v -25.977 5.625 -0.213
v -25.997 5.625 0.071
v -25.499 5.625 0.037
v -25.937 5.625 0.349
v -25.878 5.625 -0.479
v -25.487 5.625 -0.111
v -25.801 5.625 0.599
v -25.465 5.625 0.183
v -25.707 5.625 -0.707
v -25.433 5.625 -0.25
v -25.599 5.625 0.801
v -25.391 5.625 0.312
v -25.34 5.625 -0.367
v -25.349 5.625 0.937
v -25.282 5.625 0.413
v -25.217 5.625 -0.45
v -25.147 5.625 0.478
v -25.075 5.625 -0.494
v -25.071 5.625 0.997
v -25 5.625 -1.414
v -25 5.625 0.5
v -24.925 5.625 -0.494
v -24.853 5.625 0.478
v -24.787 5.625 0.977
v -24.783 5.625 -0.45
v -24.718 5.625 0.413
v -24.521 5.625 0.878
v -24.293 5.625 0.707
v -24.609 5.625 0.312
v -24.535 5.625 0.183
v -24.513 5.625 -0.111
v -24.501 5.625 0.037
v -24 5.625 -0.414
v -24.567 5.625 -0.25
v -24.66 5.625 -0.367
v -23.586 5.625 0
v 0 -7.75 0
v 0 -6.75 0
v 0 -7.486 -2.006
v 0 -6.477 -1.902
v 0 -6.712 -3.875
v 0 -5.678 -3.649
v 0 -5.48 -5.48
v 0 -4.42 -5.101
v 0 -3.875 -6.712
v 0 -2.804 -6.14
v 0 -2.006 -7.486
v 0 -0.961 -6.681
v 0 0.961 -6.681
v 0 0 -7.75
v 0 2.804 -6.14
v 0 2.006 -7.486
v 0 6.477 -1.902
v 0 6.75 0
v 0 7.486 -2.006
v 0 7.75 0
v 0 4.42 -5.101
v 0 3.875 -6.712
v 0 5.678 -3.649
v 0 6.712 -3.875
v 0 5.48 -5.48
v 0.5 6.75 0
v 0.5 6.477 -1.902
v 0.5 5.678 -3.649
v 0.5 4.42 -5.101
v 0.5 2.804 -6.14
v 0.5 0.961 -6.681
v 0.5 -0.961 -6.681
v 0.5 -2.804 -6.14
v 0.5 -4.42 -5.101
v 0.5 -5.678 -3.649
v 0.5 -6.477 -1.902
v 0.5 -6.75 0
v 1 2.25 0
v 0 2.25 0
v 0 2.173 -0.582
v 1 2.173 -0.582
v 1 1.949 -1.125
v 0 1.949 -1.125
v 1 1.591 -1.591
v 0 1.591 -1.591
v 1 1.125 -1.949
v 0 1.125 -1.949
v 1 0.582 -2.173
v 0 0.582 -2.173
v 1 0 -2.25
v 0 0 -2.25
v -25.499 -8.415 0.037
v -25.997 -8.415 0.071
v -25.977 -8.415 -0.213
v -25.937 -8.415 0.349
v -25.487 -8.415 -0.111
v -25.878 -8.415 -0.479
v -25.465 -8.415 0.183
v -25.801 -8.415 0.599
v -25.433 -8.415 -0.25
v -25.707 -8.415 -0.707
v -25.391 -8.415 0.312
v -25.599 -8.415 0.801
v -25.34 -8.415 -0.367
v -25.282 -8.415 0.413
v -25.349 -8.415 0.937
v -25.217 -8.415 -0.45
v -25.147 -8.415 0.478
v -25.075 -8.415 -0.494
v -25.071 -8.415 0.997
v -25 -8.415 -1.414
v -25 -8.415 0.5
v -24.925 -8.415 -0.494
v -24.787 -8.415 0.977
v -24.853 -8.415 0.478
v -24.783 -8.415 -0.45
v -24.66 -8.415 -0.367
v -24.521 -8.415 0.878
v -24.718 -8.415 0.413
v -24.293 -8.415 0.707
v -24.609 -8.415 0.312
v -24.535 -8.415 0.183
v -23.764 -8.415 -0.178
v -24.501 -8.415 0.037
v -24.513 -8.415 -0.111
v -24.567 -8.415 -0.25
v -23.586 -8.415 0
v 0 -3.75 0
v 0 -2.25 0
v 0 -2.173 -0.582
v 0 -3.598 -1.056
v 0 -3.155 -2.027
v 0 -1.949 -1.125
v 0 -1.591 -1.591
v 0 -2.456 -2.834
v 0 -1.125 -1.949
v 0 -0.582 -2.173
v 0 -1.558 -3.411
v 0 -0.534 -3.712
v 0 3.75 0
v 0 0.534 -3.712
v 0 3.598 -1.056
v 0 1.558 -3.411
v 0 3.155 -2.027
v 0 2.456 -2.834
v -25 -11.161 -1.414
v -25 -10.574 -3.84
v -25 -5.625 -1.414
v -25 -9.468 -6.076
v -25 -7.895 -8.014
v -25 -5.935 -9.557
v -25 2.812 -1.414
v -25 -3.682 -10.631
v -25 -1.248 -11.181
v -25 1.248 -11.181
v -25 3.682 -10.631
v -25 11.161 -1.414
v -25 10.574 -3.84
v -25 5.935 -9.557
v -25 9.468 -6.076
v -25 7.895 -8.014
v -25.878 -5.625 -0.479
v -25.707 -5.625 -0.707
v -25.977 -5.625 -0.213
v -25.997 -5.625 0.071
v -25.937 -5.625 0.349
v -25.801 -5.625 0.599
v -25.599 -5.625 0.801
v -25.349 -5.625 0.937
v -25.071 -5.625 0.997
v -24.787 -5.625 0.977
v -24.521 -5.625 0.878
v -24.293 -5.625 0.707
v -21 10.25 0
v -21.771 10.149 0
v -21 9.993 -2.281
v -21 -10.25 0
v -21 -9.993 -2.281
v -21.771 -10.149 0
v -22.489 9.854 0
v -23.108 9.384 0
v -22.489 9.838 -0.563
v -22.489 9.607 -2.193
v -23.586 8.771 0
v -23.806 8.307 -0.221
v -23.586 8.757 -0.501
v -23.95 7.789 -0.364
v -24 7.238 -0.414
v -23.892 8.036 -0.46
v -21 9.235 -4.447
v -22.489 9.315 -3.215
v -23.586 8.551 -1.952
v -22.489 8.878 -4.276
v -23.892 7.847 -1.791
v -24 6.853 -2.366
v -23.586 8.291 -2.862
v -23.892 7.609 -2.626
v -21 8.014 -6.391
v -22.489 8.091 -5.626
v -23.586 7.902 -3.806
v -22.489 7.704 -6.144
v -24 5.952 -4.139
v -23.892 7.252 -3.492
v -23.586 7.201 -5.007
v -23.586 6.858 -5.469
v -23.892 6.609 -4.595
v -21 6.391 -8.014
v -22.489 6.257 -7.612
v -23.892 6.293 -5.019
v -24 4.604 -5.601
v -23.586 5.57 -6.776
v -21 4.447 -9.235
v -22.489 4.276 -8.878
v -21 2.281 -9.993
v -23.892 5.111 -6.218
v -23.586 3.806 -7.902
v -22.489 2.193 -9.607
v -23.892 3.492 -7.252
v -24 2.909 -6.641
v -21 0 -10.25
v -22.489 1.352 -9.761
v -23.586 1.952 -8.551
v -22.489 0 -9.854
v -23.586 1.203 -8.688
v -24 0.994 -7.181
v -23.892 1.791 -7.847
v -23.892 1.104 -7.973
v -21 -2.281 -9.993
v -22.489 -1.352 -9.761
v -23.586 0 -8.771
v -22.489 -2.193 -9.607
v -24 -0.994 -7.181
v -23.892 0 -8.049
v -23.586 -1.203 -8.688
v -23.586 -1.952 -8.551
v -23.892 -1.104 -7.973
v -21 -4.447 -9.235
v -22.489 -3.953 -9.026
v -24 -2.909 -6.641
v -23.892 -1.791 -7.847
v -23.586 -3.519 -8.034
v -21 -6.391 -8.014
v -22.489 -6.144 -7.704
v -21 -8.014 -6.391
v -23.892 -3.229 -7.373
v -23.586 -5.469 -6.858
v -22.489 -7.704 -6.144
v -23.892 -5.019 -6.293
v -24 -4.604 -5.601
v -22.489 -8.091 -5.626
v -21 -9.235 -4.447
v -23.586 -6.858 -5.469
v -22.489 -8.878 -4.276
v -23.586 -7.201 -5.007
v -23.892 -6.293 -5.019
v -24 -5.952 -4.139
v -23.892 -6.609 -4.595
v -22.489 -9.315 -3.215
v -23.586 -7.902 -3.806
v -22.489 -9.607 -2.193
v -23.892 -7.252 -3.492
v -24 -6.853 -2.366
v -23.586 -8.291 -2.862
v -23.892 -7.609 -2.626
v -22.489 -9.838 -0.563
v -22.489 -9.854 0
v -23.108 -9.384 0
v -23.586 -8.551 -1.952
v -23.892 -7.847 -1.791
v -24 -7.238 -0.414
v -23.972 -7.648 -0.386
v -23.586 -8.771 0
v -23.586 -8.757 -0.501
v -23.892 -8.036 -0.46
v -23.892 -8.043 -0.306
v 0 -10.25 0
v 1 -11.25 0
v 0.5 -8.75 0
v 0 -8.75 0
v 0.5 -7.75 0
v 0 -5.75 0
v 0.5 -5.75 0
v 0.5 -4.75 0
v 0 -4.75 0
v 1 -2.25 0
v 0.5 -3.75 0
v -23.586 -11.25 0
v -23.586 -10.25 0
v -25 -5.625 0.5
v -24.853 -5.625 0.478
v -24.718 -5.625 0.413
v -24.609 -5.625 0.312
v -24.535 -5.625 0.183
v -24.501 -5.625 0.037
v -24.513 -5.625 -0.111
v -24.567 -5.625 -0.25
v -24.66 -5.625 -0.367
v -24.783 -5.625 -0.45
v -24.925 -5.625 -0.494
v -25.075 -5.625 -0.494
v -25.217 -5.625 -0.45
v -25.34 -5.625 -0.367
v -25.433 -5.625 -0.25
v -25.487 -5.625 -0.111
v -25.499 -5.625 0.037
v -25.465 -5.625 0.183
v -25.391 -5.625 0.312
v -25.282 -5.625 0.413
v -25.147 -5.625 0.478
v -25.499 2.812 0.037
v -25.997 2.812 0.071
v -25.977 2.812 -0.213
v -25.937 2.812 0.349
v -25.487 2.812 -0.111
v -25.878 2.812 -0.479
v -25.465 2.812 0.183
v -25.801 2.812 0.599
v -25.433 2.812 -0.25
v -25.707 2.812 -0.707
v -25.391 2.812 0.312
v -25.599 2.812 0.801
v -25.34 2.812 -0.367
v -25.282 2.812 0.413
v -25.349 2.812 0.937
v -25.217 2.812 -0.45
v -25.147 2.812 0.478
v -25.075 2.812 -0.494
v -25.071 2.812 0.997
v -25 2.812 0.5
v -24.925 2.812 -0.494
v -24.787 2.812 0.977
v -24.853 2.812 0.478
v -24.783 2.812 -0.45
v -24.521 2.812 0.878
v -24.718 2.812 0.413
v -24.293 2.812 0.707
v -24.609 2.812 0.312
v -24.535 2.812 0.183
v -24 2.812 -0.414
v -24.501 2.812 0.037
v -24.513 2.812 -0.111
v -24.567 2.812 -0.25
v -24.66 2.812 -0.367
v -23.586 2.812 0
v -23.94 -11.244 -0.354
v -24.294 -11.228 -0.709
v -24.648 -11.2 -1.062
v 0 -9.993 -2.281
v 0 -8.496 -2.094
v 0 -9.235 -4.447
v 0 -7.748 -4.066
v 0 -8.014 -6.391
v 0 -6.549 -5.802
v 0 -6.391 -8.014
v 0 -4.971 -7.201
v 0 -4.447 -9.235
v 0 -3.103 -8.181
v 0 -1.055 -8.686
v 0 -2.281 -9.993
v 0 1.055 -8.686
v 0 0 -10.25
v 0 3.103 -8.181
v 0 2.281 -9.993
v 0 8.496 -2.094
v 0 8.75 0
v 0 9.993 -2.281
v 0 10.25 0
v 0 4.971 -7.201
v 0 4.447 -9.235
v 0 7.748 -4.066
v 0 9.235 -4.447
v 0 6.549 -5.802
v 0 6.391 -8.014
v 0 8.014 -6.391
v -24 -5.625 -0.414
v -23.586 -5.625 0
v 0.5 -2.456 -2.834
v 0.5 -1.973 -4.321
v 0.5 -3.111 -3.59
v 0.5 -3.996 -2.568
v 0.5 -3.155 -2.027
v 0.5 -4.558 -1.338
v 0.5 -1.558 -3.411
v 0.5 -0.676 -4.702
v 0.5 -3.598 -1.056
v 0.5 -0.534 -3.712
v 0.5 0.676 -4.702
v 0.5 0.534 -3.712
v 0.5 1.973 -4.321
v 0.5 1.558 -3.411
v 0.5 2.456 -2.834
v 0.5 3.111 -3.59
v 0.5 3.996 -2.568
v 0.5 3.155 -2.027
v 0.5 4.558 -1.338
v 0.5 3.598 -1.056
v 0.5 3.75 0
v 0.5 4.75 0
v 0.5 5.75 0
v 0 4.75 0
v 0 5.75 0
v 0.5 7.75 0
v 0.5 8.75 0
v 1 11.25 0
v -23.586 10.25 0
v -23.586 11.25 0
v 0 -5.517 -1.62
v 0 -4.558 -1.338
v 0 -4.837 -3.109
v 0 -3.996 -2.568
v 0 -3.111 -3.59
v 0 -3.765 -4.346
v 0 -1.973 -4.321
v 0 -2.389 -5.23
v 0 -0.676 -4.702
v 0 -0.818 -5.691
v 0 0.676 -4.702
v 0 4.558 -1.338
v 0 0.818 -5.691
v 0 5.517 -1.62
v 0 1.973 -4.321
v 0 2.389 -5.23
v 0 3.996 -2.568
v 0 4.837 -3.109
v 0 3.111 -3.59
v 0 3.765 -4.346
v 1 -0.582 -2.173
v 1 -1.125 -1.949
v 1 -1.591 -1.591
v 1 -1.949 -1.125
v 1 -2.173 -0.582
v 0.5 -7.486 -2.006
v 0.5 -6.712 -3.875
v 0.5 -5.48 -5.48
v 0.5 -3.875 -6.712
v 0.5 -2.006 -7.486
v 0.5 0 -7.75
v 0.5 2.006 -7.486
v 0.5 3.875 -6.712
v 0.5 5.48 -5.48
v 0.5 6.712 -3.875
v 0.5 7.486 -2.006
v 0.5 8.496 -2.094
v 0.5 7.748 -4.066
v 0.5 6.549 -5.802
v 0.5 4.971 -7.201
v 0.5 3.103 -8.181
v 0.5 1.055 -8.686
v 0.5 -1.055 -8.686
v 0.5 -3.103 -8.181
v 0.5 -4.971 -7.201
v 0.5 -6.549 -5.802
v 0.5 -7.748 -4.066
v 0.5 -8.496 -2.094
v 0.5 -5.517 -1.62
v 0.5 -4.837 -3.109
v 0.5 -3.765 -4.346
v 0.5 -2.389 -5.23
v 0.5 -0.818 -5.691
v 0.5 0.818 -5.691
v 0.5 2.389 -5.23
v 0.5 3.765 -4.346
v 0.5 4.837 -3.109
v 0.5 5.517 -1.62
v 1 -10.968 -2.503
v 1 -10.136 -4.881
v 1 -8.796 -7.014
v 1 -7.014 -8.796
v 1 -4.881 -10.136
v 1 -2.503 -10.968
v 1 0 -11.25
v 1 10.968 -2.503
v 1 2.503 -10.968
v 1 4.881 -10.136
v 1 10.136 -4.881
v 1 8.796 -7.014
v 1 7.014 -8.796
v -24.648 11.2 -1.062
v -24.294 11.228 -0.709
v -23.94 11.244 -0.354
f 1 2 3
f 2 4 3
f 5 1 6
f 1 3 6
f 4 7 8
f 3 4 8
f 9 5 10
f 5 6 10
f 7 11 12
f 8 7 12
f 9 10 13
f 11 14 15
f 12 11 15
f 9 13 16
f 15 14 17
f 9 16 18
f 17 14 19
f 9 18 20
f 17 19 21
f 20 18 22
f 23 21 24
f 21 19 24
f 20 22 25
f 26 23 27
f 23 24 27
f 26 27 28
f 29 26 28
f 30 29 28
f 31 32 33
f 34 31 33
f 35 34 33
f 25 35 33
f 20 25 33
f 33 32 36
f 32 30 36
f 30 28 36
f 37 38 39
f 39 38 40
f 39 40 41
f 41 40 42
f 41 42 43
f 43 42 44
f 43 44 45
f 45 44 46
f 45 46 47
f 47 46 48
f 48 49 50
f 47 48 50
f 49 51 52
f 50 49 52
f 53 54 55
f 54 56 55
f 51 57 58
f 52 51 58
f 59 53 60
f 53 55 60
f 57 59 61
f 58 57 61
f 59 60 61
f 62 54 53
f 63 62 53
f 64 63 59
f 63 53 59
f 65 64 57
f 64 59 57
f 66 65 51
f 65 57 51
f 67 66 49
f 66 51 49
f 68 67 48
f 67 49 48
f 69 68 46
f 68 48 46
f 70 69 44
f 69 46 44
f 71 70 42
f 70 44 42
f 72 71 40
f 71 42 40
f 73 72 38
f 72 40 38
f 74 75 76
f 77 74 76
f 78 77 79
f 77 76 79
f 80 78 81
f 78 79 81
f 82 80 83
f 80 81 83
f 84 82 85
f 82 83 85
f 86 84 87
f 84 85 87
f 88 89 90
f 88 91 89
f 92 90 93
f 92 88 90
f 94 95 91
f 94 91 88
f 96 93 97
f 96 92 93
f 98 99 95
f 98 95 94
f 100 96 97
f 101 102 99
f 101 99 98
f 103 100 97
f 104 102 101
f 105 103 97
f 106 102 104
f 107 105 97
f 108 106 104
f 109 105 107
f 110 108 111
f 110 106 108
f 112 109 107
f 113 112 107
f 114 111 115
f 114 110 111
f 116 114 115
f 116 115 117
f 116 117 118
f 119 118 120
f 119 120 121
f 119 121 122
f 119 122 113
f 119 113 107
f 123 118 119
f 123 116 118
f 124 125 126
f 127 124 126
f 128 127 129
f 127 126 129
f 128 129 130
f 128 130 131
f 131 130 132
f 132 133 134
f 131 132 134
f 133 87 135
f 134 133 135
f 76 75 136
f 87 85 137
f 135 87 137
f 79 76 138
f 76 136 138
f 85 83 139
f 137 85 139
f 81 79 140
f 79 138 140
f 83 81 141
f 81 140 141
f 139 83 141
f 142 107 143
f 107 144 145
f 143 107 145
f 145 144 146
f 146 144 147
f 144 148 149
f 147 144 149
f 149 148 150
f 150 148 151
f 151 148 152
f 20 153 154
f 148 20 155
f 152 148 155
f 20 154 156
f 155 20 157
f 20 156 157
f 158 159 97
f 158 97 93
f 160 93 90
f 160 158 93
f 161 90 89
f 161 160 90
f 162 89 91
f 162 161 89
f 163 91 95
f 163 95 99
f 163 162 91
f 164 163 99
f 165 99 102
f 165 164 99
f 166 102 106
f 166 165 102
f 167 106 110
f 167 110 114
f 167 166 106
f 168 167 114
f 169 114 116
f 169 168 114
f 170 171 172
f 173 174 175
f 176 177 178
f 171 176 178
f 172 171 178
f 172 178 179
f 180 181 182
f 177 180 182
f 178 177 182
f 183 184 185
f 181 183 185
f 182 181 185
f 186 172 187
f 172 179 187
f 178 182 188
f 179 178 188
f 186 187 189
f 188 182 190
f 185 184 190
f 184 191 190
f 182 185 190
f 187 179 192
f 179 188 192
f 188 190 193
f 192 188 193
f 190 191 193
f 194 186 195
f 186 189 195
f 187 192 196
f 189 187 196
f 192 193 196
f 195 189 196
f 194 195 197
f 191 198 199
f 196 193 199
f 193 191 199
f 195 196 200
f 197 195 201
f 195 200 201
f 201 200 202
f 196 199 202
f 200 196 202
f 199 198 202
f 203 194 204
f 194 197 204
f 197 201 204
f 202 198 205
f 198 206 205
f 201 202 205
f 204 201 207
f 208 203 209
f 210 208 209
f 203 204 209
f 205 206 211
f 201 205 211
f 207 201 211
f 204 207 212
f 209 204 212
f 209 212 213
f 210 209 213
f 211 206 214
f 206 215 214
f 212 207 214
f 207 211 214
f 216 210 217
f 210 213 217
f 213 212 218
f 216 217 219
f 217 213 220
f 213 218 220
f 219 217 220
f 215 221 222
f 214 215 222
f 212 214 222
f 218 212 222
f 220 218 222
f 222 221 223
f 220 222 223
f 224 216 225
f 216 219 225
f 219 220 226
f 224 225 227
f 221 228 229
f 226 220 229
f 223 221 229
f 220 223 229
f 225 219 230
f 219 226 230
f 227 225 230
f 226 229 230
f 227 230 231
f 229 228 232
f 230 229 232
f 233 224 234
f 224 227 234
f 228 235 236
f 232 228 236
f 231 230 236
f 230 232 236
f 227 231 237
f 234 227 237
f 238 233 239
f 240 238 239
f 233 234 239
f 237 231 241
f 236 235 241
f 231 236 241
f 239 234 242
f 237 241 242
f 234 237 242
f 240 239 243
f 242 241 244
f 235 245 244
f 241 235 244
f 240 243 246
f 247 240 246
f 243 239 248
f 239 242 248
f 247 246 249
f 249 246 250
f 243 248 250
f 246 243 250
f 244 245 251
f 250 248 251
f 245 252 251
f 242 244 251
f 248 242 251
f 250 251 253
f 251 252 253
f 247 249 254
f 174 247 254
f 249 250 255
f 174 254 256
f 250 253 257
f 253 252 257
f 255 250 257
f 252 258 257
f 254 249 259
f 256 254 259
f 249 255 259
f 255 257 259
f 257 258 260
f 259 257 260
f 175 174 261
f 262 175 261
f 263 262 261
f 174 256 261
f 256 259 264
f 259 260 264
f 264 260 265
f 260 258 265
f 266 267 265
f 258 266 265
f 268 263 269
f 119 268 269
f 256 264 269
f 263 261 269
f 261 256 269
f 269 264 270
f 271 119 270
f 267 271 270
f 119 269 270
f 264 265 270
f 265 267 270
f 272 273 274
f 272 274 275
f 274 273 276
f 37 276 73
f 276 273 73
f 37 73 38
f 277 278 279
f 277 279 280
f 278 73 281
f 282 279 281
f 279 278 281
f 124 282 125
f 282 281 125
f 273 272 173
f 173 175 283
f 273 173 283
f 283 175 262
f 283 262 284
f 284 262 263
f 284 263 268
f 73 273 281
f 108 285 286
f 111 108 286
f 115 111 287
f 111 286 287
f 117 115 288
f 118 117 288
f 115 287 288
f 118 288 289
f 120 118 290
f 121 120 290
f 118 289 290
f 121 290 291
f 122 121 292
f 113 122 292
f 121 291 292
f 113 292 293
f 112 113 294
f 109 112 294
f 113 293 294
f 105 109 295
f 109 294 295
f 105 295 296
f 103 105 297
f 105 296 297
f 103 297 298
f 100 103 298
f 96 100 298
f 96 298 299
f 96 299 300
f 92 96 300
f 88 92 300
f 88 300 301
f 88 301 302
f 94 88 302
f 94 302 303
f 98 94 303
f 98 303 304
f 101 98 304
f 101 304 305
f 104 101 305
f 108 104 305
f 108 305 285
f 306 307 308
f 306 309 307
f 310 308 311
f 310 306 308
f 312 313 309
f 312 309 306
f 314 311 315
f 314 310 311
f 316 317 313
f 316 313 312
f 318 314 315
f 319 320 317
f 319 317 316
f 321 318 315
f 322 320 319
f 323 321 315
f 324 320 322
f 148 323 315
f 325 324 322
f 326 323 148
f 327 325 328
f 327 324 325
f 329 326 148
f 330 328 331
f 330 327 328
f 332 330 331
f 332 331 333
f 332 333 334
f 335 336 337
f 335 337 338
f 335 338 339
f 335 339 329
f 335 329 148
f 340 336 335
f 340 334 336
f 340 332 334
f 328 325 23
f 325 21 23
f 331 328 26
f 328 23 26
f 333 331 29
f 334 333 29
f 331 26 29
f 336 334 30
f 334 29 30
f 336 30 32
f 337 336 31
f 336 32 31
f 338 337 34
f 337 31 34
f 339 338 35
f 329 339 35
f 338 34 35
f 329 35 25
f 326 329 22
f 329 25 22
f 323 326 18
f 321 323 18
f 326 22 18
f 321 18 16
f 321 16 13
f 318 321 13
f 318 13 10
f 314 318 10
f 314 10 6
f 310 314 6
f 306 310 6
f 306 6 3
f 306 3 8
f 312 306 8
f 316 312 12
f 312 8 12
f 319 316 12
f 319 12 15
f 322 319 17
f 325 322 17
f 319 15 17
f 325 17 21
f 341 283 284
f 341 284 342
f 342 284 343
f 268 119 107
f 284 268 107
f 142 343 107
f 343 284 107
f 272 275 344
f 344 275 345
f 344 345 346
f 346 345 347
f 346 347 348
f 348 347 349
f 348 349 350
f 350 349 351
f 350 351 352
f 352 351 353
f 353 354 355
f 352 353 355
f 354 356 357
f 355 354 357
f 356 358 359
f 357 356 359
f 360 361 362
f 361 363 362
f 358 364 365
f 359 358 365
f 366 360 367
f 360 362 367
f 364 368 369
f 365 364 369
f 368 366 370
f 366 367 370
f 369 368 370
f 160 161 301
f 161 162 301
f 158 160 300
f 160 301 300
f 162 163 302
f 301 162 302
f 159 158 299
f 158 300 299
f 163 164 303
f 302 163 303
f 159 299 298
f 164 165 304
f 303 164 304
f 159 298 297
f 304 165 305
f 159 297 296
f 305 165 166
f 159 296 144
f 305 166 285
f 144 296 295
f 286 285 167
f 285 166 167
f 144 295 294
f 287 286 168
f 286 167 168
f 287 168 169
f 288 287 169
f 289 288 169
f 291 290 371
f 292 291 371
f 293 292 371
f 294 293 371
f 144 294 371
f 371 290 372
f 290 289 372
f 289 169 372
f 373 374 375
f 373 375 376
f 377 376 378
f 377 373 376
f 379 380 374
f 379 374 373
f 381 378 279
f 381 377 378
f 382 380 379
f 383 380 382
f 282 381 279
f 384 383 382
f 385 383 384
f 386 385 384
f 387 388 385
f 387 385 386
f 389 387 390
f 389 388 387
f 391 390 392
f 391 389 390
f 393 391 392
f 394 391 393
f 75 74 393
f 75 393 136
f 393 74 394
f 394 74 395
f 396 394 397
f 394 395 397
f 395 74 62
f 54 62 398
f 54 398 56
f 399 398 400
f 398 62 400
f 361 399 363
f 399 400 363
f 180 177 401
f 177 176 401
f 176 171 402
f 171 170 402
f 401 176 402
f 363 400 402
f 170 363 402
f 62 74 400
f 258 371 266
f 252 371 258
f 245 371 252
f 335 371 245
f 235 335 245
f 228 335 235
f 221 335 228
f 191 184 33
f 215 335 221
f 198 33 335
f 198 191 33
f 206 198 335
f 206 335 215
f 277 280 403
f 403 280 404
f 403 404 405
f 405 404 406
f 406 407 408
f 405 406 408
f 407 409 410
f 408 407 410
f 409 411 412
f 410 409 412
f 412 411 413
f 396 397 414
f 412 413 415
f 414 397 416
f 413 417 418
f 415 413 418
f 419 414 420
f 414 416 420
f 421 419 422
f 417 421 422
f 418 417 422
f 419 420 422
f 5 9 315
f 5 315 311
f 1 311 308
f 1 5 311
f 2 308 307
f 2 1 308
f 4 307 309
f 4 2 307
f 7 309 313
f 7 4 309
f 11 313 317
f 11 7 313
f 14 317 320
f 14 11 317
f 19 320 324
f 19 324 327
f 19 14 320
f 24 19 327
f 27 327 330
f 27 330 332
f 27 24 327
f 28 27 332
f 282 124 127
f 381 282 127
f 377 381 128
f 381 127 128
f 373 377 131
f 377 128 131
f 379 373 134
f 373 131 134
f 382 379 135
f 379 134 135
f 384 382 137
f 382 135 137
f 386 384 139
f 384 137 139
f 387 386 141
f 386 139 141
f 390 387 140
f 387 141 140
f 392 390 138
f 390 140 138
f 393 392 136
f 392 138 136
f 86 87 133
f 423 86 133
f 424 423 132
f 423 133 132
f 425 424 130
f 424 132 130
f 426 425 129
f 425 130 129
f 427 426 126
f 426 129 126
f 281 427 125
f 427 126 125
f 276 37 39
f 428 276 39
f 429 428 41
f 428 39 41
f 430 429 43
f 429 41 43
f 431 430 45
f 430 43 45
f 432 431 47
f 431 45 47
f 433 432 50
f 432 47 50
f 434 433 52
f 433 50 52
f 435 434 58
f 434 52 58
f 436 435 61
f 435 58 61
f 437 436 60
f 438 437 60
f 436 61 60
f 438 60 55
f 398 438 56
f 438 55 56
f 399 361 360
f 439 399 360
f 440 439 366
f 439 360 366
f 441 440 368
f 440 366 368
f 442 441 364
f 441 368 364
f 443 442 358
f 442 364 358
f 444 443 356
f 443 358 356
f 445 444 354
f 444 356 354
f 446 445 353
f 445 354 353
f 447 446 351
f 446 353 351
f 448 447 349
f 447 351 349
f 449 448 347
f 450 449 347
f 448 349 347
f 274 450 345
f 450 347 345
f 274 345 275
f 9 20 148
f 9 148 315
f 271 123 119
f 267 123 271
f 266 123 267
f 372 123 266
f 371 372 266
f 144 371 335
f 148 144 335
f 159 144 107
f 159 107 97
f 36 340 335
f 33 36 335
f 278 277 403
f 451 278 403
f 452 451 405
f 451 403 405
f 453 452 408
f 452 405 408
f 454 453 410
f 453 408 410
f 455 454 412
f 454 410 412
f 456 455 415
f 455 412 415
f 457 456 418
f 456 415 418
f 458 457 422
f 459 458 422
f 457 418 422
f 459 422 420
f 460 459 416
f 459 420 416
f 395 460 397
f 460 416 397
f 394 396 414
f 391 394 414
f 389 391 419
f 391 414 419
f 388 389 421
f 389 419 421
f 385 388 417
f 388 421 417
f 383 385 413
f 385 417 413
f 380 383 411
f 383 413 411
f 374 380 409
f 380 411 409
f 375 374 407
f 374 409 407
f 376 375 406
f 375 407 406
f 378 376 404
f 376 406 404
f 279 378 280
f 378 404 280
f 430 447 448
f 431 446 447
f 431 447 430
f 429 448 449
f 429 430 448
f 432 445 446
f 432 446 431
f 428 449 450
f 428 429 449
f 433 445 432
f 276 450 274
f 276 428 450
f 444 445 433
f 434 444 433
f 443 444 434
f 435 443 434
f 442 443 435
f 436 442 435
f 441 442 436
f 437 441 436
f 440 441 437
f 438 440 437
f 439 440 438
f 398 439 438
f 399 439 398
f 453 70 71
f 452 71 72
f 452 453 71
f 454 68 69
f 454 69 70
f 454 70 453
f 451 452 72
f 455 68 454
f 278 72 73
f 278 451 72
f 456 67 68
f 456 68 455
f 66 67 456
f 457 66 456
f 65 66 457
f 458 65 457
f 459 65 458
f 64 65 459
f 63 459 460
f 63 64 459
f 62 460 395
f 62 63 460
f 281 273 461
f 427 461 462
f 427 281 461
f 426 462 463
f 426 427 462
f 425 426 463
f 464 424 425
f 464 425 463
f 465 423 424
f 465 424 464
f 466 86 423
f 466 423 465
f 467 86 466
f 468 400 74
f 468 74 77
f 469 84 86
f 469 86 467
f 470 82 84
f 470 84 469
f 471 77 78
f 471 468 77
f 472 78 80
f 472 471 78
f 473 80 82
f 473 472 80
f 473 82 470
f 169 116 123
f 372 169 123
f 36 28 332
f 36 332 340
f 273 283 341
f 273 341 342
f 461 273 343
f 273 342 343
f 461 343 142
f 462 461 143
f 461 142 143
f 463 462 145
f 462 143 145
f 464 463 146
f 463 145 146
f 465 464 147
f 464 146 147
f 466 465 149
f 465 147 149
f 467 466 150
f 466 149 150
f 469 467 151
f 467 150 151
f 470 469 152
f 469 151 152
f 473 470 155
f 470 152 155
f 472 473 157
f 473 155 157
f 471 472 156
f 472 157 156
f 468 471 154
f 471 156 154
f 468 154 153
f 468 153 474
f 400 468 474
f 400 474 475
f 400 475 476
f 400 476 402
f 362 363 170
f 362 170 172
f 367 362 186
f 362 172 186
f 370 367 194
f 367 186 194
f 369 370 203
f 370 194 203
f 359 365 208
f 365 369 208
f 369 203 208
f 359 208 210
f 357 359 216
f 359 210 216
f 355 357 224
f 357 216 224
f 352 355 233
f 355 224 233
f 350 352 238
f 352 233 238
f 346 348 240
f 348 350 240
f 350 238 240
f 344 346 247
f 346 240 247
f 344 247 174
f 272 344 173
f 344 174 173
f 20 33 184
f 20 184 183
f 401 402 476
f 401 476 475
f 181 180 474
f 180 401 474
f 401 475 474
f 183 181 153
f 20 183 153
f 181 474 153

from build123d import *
from build123d.topology import SkipClean

# Parameters (mm, degrees)
BOSS_EXTRUDE1_DEPTH = 1
CUT_EXTRUDE1_DEPTH  = 0.5
BOSS_EXTRUDE2_START = -25
BOSS_EXTRUDE2_DEPTH = 25
BOSS_EXTRUDE3_START = 1
BOSS_EXTRUDE3_DEPTH = 1
SKETCH7_R           = 0.5
BOSS_EXTRUDE4_DEPTH = 22.5
SKETCH10_R          = 0.5
CUT_EXTRUDE4_DEPTH  = 40.5
SKETCH8_W           = 10.868003522
SKETCH8_H           = 5.625
CUT_EXTRUDE2_DEPTH  = 22.5
LPATTERN1_COUNT     = 2
LPATTERN1_PITCH     = 11.25
CUT_EXTRUDE3_START  = -40.5
SKETCH9_R           = 20.473718745
SKETCH9_R_2         = 11.25
CUT_EXTRUDE3_DEPTH  = 40.5
SKETCH11_W          = 6.72531589
SKETCH11_H          = 3.584111804
SKETCH11_W_2        = 7.229090256
SKETCH11_H_2        = 3.619498095
CUT_EXTRUDE5_DEPTH  = 40.5
FILLET1_R           = 3


with BuildPart() as part:
    # Sketch1 → Boss-Extrude1 (new body)
    with BuildSketch(Plane(origin=(0, 0, 0), x_dir=(0, 0, -1), z_dir=(1, 0, 0))):
        with BuildLine():
            Line((0, -2.25), (0, -10.25))
            ThreePointArc((0, -10.25), (10.25, 0), (0, 10.25))
            Line((0, 10.25), (0, 2.25))
            ThreePointArc((0, 2.25), (1.590990258, 1.590990258), (2.25, 0))
            ThreePointArc((2.25, 0), (1.590990258, -1.590990258), (0, -2.25))
        make_face()
    extrude(amount=BOSS_EXTRUDE1_DEPTH)

    # Sketch2 → Cut-Extrude1 (cut)
    with BuildSketch(Plane.ZY):
        with BuildLine():
            ThreePointArc((0, 3.75), (2.651650429, 2.651650429), (3.75, 0))
            ThreePointArc((3.75, 0), (2.651650429, -2.651650429), (0, -3.75))
            Line((0, -3.75), (0, -4.75))
            ThreePointArc((0, -4.75), (3.358757211, -3.358757211), (4.75, 0))
            ThreePointArc((4.75, 0), (3.358757211, 3.358757211), (0, 4.75))
            Line((0, 4.75), (0, 3.75))
        make_face()
        with BuildLine():
            ThreePointArc((0, -3.75), (-3.75, 0), (0, 3.75))
            Line((0, 3.75), (0, 4.75))
            ThreePointArc((0, 4.75), (-4.75, 0), (0, -4.75))
            Line((0, -4.75), (0, -3.75))
        make_face()
        with BuildLine():
            Line((0, 6.75), (0, 5.75))
            ThreePointArc((0, 5.75), (4.065863992, 4.065863992), (5.75, 0))
            ThreePointArc((5.75, 0), (4.065863992, -4.065863992), (0, -5.75))
            Line((0, -5.75), (0, -6.75))
            ThreePointArc((0, -6.75), (4.772970773, -4.772970773), (6.75, 0))
            ThreePointArc((6.75, 0), (4.772970773, 4.772970773), (0, 6.75))
        make_face()
        with BuildLine():
            ThreePointArc((0, -5.75), (-5.75, 0), (0, 5.75))
            Line((0, 5.75), (0, 6.75))
            ThreePointArc((0, 6.75), (-6.75, 0), (0, -6.75))
            Line((0, -6.75), (0, -5.75))
        make_face()
        with BuildLine():
            Line((0, 8.75), (0, 7.75))
            ThreePointArc((0, 7.75), (5.480077554, 5.480077554), (7.75, 0))
            ThreePointArc((7.75, 0), (5.480077554, -5.480077554), (0, -7.75))
            Line((0, -7.75), (0, -8.75))
            ThreePointArc((0, -8.75), (6.187184335, -6.187184335), (8.75, 0))
            ThreePointArc((8.75, 0), (6.187184335, 6.187184335), (0, 8.75))
        make_face()
        with BuildLine():
            ThreePointArc((0, -7.75), (-7.75, 0), (0, 7.75))
            Line((0, 7.75), (0, 8.75))
            ThreePointArc((0, 8.75), (-8.75, 0), (0, -8.75))
            Line((0, -8.75), (0, -7.75))
        make_face()
    extrude(amount=-CUT_EXTRUDE1_DEPTH, mode=Mode.SUBTRACT)

    # Sketch3 → Boss-Extrude2 (add)
    with BuildSketch(Plane(origin=(1, 0, 0), x_dir=(0, 0, -1), z_dir=(1, 0, 0)).offset(BOSS_EXTRUDE2_START)):
        with BuildLine():
            Line((0, -10.25), (0, -11.25))
            ThreePointArc((0, -11.25), (11.25, 0), (0, 11.25))
            Line((0, 11.25), (0, 10.25))
            ThreePointArc((0, 10.25), (10.25, 0), (0, -10.25))
        make_face()
    extrude(amount=BOSS_EXTRUDE2_DEPTH)

    # Sketch6 → Boss-Extrude3 (add)
    with BuildSketch(Plane.ZY.offset(24).offset(BOSS_EXTRUDE3_START)):
        with BuildLine():
            Line((0, 11.25), (0, -11.25))
            ThreePointArc((0, -11.25), (-11.25, 0), (0, 11.25))
        make_face()
    extrude(amount=-BOSS_EXTRUDE3_DEPTH)

    # Sketch7 → Boss-Extrude4 (add)
    with SkipClean():  # the faces are left unmerged after this step: merging them gives an invalid solid
        with BuildSketch(Plane(origin=(0, 11.25, 0), x_dir=(1, 0, 0), z_dir=(0, 1, 0))):
            with BuildLine():
                Line((-23.585786438, 0), (-25, 1.414213562))
                Line((-25, 1.414213562), (-25.707106781, 0.707106781))
                ThreePointArc((-25.707106781, 0.707106781), (-25.707106781, -0.707106781), (-24.292893219, -0.707106781))
                Line((-24.292893219, -0.707106781), (-23.585786438, 0))
            make_face()
            with Locations(Location((-25, 0, 0), (0, 0, 270))):
                Circle(SKETCH7_R, mode=Mode.SUBTRACT)
        extrude(amount=-BOSS_EXTRUDE4_DEPTH)

    # Sketch10 → Cut-Extrude4 (cut)
    with BuildSketch(Plane(origin=(0, 11.25, 0), x_dir=(1, 0, 0), z_dir=(0, 1, 0))):
        with Locations(Location((-25, 0, 0), (0, 0, 270))):
            Circle(SKETCH10_R)
    extrude(amount=-CUT_EXTRUDE4_DEPTH, mode=Mode.SUBTRACT)

    # Sketch8 → Cut-Extrude2 (cut)
    with BuildSketch(Plane(origin=(-11.792893219, 0, -11.792893219), x_dir=(0.7071067811865439, 0, -0.7071067811865511), z_dir=(0.7071067811865511, 0, 0.7071067811865439))):
        with Locations((-22.111671291, 8.4375)):
            Rectangle(SKETCH8_W, SKETCH8_H)
    cut_extrude2 = extrude(amount=-CUT_EXTRUDE2_DEPTH, mode=Mode.SUBTRACT)

    # LPattern1: Cut-Extrude2 ×2
    with Locations(*[(0, -i * LPATTERN1_PITCH, 0) for i in range(1, LPATTERN1_COUNT)]):
        add(cut_extrude2, mode=Mode.SUBTRACT)

    # Sketch9 → Cut-Extrude3 (cut)
    with BuildSketch(Plane(origin=(1, 0, 0), x_dir=(0, 0, -1), z_dir=(1, 0, 0)).offset(CUT_EXTRUDE3_START)):
        Circle(SKETCH9_R)
        Circle(SKETCH9_R_2, mode=Mode.SUBTRACT)
    extrude(amount=CUT_EXTRUDE3_DEPTH, mode=Mode.SUBTRACT)

    # Sketch11 → Cut-Extrude5 (cut)
    with BuildSketch(Plane(origin=(-11.792893219, 0, -11.792893219), x_dir=(0.7071067811865434, 0, -0.7071067811865517), z_dir=(0.7071067811865517, 0, 0.7071067811865434))):
        with Locations((-20.040327475, 1.020444098)):
            Rectangle(SKETCH11_W, SKETCH11_H)
        with Locations((-20.292214658, -10.224678683)):
            Rectangle(SKETCH11_W_2, SKETCH11_H_2)
    extrude(amount=-CUT_EXTRUDE5_DEPTH, mode=Mode.SUBTRACT)

    # Fillet1
    # the kernel refuses this fillet: 3 mm, written as the material it adds along each edge
    with BuildSketch(Plane(origin=(-24, 0, 0), x_dir=(0, 0.7697147606602491, 0.6383879598032339), z_dir=(0, -0.6383879598032339, 0.7697147606602491))) as fillet1_piece_1_section:
        with BuildLine():
            CenterArc((10.25 - FILLET1_R, -FILLET1_R), FILLET1_R, 0, 90)
            Line((10.25 - FILLET1_R, 0), (10.25, 0))
            Line((10.25, 0), (10.25, -FILLET1_R))
        make_face()
    fillet1_piece_1 = revolve(axis=Axis((-24, 0, 0), (-1, 0, 0)), revolution_arc=259.343436967, mode=Mode.PRIVATE)
    fillet1_piece_1 = split(fillet1_piece_1, bisect_by=Plane(origin=(-23.150246859, 0, 0), z_dir=(0, 0, -1)), keep=Keep.TOP, mode=Mode.PRIVATE)
    fillet1_piece_1 = split(fillet1_piece_1, bisect_by=Plane(origin=(-28.068140078, 0, -4.482353641), z_dir=(0.7071067811865434, 0, -0.7071067811865517)), keep=Keep.TOP, mode=Mode.PRIVATE)
    add(fillet1_piece_1)


solid = part.part
